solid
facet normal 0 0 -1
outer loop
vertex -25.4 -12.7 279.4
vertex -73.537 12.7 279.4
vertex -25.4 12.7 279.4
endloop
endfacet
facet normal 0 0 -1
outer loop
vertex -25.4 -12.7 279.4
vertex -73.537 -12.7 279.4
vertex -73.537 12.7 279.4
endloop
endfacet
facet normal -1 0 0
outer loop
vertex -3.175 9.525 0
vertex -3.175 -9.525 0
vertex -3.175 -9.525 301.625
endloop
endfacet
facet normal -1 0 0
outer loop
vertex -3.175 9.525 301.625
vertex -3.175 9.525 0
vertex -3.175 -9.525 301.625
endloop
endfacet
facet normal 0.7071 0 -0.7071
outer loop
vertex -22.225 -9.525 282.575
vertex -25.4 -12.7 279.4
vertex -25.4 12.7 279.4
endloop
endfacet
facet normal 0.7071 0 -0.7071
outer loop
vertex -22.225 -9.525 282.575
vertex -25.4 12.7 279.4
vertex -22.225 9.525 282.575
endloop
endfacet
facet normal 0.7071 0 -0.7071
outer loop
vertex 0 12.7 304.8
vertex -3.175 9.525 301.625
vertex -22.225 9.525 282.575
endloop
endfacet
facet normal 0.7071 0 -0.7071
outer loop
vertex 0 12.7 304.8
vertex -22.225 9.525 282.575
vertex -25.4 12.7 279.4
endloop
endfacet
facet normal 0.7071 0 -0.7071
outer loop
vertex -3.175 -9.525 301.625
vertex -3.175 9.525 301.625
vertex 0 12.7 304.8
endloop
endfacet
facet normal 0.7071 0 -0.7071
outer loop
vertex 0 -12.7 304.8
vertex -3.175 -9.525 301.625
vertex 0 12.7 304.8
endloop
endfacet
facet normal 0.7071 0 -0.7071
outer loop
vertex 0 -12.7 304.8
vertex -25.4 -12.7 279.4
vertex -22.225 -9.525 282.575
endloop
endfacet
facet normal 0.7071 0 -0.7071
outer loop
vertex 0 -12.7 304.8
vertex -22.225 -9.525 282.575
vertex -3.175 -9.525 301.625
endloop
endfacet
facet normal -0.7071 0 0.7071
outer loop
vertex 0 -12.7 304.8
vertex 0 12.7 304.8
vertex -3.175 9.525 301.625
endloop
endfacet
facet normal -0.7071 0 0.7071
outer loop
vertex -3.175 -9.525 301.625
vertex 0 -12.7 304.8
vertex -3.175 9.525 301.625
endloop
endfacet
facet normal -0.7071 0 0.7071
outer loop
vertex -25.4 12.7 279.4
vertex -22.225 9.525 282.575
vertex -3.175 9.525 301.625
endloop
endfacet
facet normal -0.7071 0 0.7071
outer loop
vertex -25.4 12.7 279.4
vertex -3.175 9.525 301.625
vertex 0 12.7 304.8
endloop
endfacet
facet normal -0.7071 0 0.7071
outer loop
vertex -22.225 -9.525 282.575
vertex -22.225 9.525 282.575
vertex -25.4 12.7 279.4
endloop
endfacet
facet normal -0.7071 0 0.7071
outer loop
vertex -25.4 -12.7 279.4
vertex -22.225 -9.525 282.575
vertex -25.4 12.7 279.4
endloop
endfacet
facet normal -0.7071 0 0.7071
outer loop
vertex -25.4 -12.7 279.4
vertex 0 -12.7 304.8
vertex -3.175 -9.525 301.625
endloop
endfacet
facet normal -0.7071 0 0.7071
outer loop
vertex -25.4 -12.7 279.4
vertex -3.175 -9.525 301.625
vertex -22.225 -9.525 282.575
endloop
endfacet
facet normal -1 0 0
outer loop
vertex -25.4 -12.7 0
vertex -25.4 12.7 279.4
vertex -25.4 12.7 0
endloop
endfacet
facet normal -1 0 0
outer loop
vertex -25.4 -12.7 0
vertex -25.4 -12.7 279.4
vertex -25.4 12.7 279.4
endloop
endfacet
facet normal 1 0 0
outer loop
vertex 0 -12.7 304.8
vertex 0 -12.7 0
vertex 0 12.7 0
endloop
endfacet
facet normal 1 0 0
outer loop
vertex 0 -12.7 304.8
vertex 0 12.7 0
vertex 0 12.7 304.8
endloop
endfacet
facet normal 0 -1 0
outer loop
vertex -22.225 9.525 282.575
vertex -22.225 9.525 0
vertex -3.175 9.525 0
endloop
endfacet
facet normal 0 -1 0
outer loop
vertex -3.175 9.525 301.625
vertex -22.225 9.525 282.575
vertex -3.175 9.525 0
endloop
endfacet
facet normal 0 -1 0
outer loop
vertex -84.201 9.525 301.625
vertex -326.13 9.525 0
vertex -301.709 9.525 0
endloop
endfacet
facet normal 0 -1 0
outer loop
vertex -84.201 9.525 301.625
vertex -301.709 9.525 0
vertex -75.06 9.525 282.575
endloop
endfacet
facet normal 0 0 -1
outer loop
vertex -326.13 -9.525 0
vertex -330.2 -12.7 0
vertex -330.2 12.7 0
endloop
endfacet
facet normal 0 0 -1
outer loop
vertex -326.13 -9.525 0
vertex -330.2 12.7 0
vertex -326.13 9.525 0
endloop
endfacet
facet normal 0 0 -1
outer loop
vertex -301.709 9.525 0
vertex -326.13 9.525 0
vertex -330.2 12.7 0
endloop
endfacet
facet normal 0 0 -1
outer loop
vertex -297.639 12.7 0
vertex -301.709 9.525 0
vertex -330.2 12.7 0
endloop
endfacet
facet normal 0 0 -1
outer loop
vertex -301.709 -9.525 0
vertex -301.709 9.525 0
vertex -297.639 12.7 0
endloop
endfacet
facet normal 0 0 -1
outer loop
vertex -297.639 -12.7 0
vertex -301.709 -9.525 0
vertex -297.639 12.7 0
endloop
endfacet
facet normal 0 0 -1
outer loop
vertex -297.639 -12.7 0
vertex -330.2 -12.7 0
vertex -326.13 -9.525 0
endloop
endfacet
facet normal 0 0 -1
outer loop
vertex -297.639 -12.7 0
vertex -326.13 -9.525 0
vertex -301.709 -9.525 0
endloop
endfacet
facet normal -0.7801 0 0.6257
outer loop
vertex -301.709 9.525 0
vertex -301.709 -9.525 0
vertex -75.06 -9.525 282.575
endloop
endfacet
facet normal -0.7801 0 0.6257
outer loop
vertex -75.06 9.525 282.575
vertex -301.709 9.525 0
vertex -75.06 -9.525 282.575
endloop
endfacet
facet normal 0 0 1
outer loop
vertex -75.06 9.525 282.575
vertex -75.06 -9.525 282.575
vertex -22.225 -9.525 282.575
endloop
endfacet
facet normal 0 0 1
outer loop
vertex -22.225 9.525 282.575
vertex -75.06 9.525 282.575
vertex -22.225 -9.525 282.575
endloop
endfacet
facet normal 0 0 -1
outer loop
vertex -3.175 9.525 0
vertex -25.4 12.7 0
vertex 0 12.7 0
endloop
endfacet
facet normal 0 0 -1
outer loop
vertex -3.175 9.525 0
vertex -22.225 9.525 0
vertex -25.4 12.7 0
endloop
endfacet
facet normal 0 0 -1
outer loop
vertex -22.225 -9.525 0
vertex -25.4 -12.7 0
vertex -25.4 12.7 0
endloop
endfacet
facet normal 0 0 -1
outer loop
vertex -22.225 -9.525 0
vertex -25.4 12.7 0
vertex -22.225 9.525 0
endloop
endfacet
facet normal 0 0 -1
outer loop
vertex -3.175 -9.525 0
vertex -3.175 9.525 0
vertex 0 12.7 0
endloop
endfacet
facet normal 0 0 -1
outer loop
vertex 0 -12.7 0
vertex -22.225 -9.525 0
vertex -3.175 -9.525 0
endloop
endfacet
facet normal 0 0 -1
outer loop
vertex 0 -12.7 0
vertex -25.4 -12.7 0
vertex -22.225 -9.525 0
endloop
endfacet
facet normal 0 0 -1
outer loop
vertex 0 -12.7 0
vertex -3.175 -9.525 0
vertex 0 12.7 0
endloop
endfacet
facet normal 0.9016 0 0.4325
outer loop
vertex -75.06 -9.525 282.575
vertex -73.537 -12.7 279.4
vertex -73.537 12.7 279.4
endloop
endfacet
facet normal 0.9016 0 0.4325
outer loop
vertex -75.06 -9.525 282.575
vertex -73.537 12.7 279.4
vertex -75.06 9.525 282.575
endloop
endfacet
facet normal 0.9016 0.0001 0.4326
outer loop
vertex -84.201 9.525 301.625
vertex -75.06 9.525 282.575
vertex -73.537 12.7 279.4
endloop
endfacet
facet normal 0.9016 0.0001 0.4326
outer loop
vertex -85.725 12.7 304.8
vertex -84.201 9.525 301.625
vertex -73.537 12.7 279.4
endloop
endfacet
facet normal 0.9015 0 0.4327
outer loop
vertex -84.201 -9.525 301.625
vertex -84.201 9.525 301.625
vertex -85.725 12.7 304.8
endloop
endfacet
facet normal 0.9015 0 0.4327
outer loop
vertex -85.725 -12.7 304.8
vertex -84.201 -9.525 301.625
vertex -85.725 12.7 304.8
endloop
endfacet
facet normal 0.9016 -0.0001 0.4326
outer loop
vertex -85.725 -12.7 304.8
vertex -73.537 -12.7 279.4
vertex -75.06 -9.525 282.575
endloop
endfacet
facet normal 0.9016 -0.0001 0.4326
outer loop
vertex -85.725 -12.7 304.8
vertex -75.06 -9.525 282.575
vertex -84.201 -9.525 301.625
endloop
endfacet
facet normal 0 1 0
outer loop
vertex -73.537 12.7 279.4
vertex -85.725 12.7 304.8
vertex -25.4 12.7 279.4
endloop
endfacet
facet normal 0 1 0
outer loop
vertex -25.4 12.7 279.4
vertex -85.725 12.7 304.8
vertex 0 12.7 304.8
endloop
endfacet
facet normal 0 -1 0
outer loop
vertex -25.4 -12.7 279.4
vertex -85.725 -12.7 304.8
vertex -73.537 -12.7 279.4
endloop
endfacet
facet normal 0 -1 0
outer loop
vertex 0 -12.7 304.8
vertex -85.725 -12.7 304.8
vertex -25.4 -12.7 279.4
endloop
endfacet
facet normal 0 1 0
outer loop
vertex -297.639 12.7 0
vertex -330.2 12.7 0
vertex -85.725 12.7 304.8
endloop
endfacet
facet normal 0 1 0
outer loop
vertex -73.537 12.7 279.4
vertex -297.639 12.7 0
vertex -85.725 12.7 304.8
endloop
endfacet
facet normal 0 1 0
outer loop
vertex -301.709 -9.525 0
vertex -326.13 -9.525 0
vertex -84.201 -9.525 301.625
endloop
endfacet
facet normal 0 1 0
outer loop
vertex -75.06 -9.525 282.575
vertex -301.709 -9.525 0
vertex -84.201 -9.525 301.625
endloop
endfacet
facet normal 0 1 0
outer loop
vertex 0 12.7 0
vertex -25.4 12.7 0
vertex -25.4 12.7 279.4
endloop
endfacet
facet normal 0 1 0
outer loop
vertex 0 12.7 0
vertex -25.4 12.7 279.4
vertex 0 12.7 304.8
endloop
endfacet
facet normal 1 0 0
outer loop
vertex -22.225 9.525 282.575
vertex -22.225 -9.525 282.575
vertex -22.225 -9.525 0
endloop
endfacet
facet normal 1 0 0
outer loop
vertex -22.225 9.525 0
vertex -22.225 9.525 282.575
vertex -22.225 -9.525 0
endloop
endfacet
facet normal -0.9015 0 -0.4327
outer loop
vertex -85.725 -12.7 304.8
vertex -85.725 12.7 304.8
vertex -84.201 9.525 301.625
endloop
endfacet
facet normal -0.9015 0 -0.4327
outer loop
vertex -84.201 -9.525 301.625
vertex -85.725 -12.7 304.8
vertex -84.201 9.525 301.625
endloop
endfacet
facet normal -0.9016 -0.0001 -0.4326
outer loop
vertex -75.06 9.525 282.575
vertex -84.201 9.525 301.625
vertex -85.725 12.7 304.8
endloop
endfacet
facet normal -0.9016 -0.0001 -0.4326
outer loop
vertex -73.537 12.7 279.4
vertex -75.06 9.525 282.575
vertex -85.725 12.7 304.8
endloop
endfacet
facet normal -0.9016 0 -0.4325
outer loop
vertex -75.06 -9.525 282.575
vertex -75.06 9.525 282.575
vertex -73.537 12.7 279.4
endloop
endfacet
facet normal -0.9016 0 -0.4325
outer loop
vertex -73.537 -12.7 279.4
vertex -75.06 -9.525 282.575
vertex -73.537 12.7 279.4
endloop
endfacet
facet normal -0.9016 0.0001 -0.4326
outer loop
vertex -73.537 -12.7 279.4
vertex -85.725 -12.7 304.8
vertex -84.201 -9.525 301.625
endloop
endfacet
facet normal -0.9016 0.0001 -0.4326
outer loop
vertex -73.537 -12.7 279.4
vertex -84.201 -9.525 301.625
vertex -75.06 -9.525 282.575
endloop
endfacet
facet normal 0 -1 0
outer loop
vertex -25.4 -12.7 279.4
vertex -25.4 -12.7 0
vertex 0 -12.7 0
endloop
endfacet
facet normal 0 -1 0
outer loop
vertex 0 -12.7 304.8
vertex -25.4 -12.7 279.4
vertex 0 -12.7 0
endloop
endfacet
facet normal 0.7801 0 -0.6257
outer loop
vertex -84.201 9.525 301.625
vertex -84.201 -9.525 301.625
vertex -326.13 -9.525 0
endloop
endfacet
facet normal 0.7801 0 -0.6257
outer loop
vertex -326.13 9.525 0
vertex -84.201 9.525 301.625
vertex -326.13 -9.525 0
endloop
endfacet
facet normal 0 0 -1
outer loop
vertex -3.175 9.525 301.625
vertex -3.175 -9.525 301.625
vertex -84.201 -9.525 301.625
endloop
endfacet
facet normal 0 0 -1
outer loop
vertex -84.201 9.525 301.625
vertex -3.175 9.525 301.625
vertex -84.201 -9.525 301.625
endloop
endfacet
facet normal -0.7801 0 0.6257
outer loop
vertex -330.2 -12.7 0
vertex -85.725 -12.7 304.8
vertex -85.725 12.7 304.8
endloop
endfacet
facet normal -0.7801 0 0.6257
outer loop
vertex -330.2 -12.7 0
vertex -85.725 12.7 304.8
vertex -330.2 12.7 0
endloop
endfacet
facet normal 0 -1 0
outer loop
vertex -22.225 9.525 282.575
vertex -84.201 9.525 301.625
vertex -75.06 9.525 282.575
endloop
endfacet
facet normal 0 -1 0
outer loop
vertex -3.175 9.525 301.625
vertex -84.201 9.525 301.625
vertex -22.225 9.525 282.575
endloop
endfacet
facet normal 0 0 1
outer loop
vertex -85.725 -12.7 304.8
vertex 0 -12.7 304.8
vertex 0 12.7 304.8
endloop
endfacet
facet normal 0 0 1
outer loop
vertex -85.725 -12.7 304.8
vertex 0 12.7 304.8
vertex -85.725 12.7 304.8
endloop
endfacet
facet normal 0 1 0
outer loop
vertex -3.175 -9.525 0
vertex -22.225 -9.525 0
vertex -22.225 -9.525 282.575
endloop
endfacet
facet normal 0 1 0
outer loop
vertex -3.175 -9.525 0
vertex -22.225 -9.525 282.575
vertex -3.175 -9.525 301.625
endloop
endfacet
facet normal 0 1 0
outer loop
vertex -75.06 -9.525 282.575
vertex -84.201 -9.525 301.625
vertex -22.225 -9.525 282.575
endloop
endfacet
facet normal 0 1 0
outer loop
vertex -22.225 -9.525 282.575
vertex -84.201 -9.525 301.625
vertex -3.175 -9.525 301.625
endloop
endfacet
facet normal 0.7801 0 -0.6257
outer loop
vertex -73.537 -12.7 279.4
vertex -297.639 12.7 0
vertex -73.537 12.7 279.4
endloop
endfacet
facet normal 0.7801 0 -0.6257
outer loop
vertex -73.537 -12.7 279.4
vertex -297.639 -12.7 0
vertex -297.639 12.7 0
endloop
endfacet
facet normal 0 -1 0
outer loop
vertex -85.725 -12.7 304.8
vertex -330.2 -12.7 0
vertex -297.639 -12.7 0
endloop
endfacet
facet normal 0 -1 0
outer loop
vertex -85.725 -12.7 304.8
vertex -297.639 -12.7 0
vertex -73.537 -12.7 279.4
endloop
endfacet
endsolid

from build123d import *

# Parameters (mm, degrees)
F1_DEPTH = 12.7
F2_DEPTH = 12.7
F3_DEPTH = 12.7
F4_T     = -3.175
F5_T     = -3.175
F6_T     = -3.175


with BuildPart() as f1:
    # F0 (on Front) → F1 (new body, symmetric)
    with BuildSketch(Plane.XZ):
        Polygon((-73.536962542, 279.4), (-85.725, 304.8), (-330.2, 0), (-297.6390458754, 0), align=None)
    extrude(amount=F1_DEPTH, both=True)

    # F4
    f4_openings = [f1.faces().sort_by_distance(p)[0] for p in [
        (-79.630981, 0, 292.1),
        (-313.919523, 0, 0),
    ]]
    offset(amount=F4_T, openings=f4_openings)


with BuildPart() as f2:
    # F0 (on Front) → F2 (new body, symmetric)
    with BuildSketch(Plane.XZ):
        Polygon((-25.4, 279.4), (0, 304.8), (-85.725, 304.8), (-73.536962542, 279.4), align=None)
    extrude(amount=F2_DEPTH, both=True)

    # F5
    f5_openings = [f2.faces().sort_by_distance(p)[0] for p in [
        (-79.630981, 0, 292.1),
        (-12.7, 0, 292.1),
    ]]
    offset(amount=F5_T, openings=f5_openings)


with BuildPart() as f3:
    # F0 (on Front) → F3 (new body, symmetric)
    with BuildSketch(Plane.XZ):
        Polygon((-25.4, 0), (0, 0), (0, 304.8), (-25.4, 279.4), align=None)
    extrude(amount=F3_DEPTH, both=True)

    # F6
    f6_openings = [f3.faces().sort_by_distance(p)[0] for p in [
        (-12.7, 0, 292.1),
        (-12.7, 0, 0),
    ]]
    offset(amount=F6_T, openings=f6_openings)


solid = Compound([f1.part, f2.part, f3.part])
